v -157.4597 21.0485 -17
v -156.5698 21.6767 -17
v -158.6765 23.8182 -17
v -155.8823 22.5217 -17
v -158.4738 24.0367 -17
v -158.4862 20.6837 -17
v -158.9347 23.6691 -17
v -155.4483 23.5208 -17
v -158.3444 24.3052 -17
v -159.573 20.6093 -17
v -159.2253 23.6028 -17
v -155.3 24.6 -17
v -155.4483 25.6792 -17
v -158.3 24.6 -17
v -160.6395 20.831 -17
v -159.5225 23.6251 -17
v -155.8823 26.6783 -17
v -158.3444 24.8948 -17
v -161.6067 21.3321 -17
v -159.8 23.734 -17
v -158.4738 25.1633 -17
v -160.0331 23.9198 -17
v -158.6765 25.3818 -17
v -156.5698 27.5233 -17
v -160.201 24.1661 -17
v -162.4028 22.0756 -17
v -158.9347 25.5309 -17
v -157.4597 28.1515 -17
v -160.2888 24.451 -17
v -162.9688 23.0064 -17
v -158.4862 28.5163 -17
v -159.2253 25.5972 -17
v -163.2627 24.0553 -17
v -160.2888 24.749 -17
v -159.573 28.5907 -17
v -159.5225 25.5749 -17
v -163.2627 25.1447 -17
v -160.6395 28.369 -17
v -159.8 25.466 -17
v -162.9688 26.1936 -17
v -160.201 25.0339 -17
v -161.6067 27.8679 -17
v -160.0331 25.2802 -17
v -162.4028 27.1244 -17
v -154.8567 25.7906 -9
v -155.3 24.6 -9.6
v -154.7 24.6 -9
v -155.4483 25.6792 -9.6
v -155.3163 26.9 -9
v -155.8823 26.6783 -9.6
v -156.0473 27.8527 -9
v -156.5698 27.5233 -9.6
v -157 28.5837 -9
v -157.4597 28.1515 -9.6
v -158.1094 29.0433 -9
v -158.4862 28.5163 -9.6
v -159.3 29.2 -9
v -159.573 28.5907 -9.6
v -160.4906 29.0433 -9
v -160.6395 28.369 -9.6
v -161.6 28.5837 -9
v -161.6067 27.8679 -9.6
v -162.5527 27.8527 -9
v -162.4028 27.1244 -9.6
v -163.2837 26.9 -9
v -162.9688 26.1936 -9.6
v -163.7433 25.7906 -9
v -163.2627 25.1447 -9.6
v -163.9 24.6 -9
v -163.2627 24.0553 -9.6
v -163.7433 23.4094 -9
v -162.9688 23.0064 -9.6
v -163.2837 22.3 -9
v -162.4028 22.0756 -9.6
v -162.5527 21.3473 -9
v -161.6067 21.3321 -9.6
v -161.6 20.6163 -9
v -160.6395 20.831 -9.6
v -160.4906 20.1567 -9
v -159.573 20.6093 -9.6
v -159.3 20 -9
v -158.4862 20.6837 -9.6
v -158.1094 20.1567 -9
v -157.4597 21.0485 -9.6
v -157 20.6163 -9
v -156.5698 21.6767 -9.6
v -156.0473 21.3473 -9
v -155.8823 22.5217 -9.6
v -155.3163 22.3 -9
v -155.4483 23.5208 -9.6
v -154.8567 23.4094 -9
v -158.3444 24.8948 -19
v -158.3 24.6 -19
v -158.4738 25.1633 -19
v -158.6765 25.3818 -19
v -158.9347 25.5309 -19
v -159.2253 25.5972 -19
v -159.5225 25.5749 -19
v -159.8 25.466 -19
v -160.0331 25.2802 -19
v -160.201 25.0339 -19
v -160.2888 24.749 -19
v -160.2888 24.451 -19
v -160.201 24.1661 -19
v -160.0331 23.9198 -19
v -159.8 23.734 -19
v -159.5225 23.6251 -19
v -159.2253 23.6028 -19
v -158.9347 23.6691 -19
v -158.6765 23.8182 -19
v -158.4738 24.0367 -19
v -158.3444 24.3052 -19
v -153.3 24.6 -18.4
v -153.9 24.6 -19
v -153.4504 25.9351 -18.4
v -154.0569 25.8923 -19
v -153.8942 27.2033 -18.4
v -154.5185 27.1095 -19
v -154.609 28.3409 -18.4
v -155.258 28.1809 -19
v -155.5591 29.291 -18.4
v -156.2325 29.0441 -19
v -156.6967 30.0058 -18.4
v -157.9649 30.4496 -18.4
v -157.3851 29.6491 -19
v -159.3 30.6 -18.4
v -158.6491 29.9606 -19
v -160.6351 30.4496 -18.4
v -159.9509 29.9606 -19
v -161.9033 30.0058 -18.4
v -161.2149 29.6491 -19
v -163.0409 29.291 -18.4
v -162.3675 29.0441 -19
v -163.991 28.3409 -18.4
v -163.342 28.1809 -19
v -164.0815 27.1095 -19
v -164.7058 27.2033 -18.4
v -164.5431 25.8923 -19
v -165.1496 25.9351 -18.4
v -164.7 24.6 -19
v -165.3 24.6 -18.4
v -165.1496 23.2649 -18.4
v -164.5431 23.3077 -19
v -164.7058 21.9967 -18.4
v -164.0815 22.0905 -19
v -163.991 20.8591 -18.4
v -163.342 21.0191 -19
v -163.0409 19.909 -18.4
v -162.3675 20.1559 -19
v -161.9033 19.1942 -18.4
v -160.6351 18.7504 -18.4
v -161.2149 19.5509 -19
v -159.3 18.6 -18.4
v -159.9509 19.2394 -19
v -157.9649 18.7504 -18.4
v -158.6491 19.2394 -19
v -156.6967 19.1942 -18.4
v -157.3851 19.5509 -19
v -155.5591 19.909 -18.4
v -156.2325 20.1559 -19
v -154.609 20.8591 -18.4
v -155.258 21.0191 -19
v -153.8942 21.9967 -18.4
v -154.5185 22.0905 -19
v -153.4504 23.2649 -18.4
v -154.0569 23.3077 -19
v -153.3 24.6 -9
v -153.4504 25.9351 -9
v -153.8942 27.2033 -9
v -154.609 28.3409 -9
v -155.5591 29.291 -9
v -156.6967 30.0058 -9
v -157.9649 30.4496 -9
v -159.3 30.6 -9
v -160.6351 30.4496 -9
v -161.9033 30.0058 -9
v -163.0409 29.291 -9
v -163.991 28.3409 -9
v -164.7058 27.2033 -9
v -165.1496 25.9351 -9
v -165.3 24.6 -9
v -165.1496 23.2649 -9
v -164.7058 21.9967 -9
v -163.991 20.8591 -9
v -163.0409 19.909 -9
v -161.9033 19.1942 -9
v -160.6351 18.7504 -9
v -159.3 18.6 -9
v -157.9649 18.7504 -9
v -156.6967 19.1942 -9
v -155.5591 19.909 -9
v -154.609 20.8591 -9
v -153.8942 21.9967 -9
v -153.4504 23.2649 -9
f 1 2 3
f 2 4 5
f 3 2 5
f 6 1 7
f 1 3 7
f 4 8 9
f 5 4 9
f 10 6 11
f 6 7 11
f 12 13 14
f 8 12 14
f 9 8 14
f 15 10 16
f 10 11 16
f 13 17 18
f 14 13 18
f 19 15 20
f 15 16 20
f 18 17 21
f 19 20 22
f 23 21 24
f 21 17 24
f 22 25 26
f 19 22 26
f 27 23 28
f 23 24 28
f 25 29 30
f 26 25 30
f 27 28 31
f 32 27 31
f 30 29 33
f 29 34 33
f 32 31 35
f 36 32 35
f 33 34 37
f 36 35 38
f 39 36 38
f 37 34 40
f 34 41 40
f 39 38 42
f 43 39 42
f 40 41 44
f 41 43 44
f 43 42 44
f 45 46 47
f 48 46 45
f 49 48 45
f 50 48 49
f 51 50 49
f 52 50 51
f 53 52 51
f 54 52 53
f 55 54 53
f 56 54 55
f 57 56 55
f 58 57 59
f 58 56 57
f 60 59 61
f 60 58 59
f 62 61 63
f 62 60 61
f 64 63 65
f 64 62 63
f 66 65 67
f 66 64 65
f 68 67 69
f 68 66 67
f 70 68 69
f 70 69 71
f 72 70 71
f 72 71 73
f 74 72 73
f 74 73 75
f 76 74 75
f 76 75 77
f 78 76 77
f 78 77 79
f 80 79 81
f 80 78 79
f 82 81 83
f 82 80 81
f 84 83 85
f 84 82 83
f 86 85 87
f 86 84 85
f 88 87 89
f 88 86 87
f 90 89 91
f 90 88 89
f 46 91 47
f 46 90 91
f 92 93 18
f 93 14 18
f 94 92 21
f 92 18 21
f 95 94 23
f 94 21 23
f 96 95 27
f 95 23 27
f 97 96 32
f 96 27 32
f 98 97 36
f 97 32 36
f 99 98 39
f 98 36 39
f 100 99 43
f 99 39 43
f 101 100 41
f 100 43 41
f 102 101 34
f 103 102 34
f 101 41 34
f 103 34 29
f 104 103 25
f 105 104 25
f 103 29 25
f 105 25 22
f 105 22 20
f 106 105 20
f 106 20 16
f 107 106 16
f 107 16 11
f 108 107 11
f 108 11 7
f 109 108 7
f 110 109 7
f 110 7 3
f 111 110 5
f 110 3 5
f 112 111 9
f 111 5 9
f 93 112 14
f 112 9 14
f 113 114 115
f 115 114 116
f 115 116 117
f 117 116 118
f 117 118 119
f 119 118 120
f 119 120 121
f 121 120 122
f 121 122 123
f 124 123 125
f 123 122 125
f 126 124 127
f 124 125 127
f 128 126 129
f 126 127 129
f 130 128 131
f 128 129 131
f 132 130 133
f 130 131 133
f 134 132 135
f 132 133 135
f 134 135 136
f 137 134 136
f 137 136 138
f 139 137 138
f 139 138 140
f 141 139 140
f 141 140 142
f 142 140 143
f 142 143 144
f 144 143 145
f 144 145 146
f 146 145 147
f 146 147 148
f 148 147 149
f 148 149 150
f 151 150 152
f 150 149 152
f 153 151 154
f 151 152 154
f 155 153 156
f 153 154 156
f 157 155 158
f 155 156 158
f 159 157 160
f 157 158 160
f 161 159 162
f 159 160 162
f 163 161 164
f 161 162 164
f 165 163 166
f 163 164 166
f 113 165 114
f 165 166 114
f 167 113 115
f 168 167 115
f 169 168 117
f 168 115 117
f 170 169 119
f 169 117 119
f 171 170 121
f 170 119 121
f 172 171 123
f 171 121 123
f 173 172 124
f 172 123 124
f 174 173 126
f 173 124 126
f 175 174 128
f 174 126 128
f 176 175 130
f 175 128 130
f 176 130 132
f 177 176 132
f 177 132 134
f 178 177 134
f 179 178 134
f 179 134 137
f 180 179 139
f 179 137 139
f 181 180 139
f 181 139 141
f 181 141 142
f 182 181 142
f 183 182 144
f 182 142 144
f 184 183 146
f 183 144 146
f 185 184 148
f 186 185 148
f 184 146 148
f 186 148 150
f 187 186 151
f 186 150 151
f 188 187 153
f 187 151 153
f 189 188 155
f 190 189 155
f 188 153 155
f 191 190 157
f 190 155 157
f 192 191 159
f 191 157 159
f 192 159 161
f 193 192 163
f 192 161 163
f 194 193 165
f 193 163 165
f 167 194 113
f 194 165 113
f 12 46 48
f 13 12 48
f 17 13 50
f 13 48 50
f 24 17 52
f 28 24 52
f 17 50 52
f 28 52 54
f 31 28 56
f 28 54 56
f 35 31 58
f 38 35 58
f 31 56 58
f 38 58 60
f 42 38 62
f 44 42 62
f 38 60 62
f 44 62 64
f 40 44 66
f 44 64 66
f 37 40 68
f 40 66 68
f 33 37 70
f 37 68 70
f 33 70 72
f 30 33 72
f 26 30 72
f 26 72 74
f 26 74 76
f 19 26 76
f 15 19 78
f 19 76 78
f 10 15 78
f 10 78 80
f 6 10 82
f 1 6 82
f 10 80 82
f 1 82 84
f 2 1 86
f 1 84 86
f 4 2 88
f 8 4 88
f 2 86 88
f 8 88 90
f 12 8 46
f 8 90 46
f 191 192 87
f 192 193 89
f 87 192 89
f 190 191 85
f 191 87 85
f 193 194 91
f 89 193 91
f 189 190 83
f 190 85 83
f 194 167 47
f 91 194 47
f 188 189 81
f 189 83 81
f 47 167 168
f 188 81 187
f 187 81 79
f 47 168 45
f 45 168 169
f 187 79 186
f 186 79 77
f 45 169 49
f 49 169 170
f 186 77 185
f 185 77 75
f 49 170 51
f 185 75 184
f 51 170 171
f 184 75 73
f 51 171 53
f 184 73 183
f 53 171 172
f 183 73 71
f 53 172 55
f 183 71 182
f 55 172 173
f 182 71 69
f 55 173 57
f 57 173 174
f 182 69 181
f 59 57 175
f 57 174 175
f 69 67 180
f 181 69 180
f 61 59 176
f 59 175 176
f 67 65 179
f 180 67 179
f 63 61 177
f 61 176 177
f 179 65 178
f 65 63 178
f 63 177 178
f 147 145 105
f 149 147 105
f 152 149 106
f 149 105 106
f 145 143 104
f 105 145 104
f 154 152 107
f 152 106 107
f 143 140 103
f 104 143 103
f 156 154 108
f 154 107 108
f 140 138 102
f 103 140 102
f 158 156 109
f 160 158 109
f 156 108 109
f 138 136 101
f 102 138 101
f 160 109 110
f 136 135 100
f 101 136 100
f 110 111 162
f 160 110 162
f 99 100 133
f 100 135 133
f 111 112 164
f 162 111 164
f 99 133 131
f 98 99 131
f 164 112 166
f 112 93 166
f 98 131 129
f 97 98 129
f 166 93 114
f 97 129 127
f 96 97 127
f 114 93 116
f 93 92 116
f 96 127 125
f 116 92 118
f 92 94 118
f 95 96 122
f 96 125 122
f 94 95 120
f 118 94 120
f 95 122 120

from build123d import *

# Parameters (mm, degrees)
CHAMFER_SIZE    = 0.6
CHAMFER001_SIZE = 0.6


with BuildPart() as part:
    # Sketch010 → Revolution001 (revolve)
    with BuildSketch(Plane.XZ):
        Polygon((1, -8), (4, -8), (4, 0), (6, 0), (6, -10), (1, -10), align=None)
    revolve(axis=Axis((0, 0, 0), (0, 0, 1)))

    # Chamfer
    chamfer_edges = [part.edges().sort_by_distance(p)[0] for p in [
        (-6, 0, -10),
    ]]
    chamfer(chamfer_edges, length=CHAMFER_SIZE)

    # Chamfer001
    chamfer001_edges = [part.edges().sort_by_distance(p)[0] for p in [
        (-4, 0, 0),
    ]]
    chamfer(chamfer001_edges, length=CHAMFER001_SIZE)


with BuildPart() as part_1:
    # Body007 placement: moved
    add(part.part.moved(Location((-159.3, 24.6, -9))))


solid = part_1.part
